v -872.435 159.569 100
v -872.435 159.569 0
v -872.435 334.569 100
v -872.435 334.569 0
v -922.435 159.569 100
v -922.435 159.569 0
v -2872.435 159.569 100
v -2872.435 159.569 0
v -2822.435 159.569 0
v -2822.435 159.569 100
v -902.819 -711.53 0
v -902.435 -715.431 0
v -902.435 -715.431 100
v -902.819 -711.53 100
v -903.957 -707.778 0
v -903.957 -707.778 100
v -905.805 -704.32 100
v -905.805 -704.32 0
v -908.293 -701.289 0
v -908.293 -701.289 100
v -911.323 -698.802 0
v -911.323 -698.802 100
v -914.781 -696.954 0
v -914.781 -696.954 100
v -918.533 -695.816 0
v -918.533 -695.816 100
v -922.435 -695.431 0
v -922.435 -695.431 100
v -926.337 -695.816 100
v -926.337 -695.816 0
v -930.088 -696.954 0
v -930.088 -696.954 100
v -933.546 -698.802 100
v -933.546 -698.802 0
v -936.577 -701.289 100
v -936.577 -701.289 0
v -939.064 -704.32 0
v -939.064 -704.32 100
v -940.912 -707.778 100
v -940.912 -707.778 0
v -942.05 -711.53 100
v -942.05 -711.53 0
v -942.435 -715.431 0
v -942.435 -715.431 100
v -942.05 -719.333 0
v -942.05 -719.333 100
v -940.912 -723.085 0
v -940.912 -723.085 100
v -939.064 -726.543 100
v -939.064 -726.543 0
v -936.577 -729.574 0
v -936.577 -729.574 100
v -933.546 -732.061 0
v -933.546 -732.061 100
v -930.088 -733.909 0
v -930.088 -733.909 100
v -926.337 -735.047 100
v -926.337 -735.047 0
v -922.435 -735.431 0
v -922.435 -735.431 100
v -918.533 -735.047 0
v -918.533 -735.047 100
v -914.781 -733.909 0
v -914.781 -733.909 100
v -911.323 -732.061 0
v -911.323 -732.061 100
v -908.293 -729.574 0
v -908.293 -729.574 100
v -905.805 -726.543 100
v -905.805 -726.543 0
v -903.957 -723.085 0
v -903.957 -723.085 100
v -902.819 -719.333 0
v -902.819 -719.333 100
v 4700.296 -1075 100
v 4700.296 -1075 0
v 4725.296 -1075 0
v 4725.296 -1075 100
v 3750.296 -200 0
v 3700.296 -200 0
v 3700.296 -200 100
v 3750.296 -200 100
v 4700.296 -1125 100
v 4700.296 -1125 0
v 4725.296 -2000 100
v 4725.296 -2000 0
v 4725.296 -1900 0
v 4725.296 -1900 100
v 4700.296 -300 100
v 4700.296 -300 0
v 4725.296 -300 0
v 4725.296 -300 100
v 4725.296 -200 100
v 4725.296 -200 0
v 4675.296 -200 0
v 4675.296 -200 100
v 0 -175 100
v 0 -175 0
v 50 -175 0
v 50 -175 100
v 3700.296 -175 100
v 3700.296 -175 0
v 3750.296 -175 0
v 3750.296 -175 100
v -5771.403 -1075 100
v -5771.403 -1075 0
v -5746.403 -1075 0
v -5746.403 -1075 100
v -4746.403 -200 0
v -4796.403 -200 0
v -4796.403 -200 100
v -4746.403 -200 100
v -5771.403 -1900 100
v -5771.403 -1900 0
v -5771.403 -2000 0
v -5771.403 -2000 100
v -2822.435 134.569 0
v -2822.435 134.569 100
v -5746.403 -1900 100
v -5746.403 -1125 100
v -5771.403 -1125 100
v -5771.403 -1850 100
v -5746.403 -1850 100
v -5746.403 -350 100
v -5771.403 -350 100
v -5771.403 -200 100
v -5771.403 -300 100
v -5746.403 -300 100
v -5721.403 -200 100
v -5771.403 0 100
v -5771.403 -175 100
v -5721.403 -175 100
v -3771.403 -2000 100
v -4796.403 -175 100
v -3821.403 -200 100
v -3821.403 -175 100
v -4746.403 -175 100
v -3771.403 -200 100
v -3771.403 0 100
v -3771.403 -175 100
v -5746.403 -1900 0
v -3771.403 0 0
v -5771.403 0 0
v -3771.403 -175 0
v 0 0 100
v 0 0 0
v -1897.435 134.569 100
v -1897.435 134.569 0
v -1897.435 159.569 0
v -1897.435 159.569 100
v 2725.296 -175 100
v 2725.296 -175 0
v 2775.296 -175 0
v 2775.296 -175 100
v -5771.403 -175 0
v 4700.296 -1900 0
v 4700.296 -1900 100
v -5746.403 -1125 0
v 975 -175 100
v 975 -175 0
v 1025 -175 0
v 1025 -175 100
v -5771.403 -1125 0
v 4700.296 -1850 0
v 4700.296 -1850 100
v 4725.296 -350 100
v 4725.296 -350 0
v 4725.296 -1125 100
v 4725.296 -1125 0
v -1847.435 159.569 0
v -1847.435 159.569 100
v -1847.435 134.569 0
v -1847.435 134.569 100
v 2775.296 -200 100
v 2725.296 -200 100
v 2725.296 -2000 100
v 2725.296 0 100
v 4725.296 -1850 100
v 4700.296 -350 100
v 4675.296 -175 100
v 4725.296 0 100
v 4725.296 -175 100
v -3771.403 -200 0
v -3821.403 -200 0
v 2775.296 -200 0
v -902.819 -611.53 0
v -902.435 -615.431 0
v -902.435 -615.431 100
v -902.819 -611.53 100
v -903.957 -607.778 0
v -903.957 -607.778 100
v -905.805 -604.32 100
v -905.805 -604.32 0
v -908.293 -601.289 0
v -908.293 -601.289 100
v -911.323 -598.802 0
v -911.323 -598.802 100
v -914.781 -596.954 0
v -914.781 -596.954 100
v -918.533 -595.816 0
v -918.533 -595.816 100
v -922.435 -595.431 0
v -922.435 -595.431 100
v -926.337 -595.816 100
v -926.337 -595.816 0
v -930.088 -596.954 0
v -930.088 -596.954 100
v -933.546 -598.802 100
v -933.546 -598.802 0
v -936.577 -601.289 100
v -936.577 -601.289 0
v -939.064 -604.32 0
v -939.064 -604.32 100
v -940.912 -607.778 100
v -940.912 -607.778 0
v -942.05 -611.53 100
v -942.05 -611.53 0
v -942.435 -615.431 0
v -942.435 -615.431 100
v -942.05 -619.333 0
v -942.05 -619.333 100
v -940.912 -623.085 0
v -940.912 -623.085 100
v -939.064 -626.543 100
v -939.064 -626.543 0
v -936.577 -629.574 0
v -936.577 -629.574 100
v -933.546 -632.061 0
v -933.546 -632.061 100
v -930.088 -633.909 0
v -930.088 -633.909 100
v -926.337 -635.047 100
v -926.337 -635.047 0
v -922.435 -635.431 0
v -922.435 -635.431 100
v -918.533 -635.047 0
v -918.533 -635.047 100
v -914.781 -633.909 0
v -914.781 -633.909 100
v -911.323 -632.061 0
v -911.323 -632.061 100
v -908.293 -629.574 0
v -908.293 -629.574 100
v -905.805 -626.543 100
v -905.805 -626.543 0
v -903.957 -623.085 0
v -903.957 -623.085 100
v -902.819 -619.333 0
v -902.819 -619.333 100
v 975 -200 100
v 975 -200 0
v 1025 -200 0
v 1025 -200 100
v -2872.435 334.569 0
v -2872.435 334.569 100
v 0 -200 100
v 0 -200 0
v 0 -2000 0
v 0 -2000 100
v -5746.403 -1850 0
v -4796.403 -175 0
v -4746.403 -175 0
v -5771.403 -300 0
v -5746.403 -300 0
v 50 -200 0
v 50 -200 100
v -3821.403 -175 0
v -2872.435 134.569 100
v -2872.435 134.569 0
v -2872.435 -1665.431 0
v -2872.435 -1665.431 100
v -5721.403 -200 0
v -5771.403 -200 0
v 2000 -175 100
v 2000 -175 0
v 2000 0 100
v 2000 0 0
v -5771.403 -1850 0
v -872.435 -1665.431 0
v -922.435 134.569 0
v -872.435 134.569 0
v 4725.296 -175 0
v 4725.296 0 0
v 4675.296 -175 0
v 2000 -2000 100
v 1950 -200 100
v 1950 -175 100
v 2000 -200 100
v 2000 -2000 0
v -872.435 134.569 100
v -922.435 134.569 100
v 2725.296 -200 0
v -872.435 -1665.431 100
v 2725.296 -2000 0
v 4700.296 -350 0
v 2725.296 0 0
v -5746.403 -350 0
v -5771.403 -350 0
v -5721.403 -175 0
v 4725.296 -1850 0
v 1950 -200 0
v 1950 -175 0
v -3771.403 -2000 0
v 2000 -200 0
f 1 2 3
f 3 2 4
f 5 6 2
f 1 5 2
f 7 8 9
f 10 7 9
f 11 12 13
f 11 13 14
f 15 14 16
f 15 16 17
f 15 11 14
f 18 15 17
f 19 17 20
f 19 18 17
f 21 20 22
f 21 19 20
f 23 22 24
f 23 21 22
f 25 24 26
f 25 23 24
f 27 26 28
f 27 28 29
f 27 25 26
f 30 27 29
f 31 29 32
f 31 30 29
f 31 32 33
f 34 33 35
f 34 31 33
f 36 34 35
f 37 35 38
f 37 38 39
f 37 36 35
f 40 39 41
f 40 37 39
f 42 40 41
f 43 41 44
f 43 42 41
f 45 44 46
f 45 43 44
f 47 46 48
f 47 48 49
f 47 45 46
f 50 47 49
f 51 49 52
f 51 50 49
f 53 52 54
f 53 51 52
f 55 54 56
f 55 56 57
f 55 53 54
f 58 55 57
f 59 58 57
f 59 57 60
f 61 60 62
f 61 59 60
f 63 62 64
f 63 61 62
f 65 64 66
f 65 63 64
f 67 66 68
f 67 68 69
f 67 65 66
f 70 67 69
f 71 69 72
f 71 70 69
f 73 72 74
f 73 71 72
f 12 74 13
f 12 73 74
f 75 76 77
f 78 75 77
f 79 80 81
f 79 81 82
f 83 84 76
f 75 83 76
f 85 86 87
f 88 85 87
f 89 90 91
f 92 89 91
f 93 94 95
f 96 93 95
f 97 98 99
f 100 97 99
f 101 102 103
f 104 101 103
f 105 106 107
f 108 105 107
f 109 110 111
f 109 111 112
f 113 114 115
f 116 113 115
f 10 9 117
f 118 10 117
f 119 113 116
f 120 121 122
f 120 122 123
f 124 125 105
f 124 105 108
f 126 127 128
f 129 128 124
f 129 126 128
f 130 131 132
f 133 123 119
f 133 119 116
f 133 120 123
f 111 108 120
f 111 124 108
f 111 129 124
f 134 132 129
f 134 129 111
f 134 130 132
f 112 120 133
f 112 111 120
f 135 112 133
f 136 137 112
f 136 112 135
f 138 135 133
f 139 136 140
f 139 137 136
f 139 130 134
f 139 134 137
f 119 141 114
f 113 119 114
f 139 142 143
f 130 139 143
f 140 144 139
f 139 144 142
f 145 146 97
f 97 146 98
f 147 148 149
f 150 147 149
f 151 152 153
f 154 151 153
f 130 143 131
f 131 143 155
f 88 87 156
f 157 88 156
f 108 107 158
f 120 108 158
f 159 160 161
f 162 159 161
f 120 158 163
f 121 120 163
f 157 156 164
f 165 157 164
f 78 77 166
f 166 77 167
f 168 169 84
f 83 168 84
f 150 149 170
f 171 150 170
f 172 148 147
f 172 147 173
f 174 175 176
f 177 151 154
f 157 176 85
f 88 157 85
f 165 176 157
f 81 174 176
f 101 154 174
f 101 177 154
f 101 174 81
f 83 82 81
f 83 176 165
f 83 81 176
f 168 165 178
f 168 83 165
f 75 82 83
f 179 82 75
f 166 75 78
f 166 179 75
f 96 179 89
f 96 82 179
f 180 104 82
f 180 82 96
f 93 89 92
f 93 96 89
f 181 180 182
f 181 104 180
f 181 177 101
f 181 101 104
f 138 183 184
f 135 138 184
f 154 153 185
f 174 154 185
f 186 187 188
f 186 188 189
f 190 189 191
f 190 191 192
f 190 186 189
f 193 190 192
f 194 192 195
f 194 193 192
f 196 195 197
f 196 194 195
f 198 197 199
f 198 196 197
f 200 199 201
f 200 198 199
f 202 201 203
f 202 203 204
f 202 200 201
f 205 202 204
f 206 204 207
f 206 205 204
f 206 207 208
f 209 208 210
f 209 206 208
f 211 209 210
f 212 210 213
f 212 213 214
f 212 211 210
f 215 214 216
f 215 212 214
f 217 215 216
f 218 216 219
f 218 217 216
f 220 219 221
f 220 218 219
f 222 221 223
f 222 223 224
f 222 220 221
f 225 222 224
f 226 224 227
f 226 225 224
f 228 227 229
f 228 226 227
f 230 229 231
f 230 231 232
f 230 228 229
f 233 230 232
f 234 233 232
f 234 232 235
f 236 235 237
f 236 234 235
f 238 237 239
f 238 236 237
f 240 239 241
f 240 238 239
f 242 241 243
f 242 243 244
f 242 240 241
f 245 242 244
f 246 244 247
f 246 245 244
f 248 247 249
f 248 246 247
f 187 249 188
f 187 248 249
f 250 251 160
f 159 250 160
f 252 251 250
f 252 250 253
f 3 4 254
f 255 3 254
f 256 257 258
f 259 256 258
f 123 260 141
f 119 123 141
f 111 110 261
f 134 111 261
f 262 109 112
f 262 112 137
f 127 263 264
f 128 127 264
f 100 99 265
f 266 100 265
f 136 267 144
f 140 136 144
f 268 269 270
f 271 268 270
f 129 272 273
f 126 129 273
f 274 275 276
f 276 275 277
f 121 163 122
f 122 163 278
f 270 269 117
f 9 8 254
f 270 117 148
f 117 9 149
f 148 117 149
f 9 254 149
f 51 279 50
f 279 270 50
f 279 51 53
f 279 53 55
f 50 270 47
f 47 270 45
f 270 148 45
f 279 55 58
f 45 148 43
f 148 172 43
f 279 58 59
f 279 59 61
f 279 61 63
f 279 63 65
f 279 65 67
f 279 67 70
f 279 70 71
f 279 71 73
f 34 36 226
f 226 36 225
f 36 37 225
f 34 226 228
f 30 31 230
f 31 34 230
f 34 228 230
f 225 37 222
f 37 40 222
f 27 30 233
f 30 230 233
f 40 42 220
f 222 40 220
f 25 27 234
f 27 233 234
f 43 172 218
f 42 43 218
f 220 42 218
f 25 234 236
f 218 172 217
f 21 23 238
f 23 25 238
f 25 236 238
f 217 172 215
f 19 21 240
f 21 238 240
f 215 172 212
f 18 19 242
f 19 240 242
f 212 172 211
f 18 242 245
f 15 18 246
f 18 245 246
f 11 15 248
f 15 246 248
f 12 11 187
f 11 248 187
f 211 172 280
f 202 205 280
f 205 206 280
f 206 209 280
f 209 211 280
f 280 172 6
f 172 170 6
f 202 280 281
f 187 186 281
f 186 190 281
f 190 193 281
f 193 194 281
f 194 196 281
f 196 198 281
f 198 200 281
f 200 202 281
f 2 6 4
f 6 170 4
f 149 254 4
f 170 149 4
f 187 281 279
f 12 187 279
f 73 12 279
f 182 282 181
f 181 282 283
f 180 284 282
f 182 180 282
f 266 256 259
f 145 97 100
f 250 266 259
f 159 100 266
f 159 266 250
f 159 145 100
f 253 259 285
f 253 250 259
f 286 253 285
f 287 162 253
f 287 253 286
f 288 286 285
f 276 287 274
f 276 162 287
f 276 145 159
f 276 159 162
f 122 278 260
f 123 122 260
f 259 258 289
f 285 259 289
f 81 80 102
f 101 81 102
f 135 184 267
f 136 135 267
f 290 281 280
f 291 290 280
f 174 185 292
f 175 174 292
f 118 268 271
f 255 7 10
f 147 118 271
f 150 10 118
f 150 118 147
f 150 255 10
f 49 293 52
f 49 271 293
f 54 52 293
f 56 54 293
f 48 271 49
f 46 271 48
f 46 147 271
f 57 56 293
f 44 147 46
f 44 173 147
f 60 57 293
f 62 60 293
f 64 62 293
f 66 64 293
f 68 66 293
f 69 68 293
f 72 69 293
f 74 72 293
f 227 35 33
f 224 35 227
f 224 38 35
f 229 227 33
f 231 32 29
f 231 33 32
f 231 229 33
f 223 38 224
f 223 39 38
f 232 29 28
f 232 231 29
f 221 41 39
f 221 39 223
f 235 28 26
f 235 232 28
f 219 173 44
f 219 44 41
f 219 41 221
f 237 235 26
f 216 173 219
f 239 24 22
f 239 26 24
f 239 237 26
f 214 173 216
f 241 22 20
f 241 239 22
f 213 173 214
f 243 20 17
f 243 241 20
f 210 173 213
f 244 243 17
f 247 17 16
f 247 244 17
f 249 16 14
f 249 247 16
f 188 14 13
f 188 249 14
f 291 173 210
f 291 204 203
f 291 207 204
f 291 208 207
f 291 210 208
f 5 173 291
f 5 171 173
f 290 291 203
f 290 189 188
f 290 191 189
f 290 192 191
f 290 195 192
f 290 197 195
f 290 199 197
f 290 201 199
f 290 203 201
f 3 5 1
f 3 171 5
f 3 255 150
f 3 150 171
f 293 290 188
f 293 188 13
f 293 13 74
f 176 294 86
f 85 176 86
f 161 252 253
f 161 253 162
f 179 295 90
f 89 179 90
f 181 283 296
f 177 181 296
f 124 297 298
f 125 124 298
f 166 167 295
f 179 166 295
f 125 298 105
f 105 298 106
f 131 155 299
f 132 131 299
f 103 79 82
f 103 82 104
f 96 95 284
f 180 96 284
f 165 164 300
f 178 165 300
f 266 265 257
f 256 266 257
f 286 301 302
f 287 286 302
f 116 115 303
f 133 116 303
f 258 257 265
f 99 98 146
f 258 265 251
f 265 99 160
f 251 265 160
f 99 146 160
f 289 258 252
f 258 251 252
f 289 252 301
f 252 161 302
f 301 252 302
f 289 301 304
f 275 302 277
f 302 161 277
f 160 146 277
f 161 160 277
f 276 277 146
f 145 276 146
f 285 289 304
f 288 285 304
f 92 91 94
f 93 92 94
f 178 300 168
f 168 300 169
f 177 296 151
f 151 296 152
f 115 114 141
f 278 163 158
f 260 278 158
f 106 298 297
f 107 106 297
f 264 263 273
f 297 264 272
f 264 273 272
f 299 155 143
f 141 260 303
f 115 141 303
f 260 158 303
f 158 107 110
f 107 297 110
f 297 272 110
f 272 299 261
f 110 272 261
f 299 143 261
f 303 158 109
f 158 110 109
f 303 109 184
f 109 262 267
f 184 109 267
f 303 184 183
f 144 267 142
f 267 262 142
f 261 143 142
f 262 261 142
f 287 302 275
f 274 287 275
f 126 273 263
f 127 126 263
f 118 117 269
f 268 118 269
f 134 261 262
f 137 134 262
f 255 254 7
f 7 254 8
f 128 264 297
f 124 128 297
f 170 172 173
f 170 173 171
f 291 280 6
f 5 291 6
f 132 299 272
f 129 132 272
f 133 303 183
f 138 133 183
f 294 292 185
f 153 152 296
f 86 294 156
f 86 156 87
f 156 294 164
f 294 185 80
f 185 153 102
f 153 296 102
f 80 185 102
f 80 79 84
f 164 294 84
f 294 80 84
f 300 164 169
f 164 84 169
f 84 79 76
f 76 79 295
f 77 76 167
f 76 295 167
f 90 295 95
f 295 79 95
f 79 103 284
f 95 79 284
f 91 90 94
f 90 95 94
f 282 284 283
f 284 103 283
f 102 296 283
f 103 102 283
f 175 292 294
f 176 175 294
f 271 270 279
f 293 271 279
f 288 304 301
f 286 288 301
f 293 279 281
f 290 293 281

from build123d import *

# Parameters (mm, degrees)
F0_W     = 50
F0_H     = 25
F1_DEPTH = 100
F2_R     = 20
F2_W     = 50
F2_H     = 25
F3_DEPTH = 100
F4_W     = 50
F4_H     = 25
F5_DEPTH = 100


with BuildPart() as f1:
    # F0 (on Top) → F1 (new body)
    with BuildSketch(Plane.XY):
        Polygon((2000, 0), (0, 0), (0, -175), (50, -175), (50, -200), (0, -200), (0, -2000), (2000, -2000), (2000, -200), (1950, -200), (1950, -175), (2000, -175), align=None)
        with Locations((1000, -187.5)):
            Rectangle(F0_W, F0_H, mode=Mode.SUBTRACT)
    extrude(amount=F1_DEPTH)


with BuildPart() as f3:
    # F2 (on Top) → F3 (new body)
    with BuildSketch(Plane.XY):
        Polygon((-872.434735, 334.568512), (-2872.434735, 334.568512), (-2872.434735, 159.568512), (-2822.434735, 159.568512), (-2822.434735, 134.568512), (-2872.434735, 134.568512), (-2872.434735, -1665.431488), (-972.434735, -1665.431488), (-872.434735, -1665.431488), (-872.434735, 134.568512), (-922.434735, 134.568512), (-922.434735, 159.568512), (-872.434735, 159.568512), align=None)
        with Locations((-922.434735, -715.431488)):
            Circle(F2_R, mode=Mode.SUBTRACT)
        with Locations((-1872.434735, 147.068512)):
            Rectangle(F2_W, F2_H, mode=Mode.SUBTRACT)
        with Locations((-922.434735, -615.431488)):
            Circle(F2_R, mode=Mode.SUBTRACT)
    extrude(amount=F3_DEPTH)


with BuildPart() as f5:
    # F4 (on Top) → F5 (new body)
    with BuildSketch(Plane.XY):
        Polygon((-3821.403074, -200), (-3821.403074, -175), (-3771.403074, -175), (-3771.403074, 0), (-5771.403074, 0), (-5771.403074, -175), (-5721.403074, -175), (-5721.403074, -200), (-5771.403074, -200), (-5771.403074, -300), (-5746.403074, -300), (-5746.403074, -350), (-5771.403074, -350), (-5771.403074, -1075), (-5746.403074, -1075), (-5746.403074, -1125), (-5771.403074, -1125), (-5771.403074, -1850), (-5746.403074, -1850), (-5746.403074, -1900), (-5771.403074, -1900), (-5771.403074, -2000), (-3771.403074, -2000), (-3771.403074, -200), align=None)
        with Locations((-4771.403074, -187.5)):
            Rectangle(F4_W, F4_H, mode=Mode.SUBTRACT)
        Polygon((2725.295782, -200), (2725.295782, -2000), (4725.295782, -2000), (4725.295782, -1900), (4700.295782, -1900), (4700.295782, -1850), (4725.295782, -1850), (4725.295782, -1125), (4700.295782, -1125), (4700.295782, -1075), (4725.295782, -1075), (4725.295782, -350), (4700.295782, -350), (4700.295782, -300), (4725.295782, -300), (4725.295782, -200), (4675.295782, -200), (4675.295782, -175), (4725.295782, -175), (4725.295782, 0), (2725.295782, 0), (2725.295782, -175), (2775.295782, -175), (2775.295782, -200), align=None)
        with Locations((3725.295782, -187.5)):
            Rectangle(F4_W, F4_H, mode=Mode.SUBTRACT)
    extrude(amount=F5_DEPTH)


solid = Compound([f1.part, f3.part, f5.part])
